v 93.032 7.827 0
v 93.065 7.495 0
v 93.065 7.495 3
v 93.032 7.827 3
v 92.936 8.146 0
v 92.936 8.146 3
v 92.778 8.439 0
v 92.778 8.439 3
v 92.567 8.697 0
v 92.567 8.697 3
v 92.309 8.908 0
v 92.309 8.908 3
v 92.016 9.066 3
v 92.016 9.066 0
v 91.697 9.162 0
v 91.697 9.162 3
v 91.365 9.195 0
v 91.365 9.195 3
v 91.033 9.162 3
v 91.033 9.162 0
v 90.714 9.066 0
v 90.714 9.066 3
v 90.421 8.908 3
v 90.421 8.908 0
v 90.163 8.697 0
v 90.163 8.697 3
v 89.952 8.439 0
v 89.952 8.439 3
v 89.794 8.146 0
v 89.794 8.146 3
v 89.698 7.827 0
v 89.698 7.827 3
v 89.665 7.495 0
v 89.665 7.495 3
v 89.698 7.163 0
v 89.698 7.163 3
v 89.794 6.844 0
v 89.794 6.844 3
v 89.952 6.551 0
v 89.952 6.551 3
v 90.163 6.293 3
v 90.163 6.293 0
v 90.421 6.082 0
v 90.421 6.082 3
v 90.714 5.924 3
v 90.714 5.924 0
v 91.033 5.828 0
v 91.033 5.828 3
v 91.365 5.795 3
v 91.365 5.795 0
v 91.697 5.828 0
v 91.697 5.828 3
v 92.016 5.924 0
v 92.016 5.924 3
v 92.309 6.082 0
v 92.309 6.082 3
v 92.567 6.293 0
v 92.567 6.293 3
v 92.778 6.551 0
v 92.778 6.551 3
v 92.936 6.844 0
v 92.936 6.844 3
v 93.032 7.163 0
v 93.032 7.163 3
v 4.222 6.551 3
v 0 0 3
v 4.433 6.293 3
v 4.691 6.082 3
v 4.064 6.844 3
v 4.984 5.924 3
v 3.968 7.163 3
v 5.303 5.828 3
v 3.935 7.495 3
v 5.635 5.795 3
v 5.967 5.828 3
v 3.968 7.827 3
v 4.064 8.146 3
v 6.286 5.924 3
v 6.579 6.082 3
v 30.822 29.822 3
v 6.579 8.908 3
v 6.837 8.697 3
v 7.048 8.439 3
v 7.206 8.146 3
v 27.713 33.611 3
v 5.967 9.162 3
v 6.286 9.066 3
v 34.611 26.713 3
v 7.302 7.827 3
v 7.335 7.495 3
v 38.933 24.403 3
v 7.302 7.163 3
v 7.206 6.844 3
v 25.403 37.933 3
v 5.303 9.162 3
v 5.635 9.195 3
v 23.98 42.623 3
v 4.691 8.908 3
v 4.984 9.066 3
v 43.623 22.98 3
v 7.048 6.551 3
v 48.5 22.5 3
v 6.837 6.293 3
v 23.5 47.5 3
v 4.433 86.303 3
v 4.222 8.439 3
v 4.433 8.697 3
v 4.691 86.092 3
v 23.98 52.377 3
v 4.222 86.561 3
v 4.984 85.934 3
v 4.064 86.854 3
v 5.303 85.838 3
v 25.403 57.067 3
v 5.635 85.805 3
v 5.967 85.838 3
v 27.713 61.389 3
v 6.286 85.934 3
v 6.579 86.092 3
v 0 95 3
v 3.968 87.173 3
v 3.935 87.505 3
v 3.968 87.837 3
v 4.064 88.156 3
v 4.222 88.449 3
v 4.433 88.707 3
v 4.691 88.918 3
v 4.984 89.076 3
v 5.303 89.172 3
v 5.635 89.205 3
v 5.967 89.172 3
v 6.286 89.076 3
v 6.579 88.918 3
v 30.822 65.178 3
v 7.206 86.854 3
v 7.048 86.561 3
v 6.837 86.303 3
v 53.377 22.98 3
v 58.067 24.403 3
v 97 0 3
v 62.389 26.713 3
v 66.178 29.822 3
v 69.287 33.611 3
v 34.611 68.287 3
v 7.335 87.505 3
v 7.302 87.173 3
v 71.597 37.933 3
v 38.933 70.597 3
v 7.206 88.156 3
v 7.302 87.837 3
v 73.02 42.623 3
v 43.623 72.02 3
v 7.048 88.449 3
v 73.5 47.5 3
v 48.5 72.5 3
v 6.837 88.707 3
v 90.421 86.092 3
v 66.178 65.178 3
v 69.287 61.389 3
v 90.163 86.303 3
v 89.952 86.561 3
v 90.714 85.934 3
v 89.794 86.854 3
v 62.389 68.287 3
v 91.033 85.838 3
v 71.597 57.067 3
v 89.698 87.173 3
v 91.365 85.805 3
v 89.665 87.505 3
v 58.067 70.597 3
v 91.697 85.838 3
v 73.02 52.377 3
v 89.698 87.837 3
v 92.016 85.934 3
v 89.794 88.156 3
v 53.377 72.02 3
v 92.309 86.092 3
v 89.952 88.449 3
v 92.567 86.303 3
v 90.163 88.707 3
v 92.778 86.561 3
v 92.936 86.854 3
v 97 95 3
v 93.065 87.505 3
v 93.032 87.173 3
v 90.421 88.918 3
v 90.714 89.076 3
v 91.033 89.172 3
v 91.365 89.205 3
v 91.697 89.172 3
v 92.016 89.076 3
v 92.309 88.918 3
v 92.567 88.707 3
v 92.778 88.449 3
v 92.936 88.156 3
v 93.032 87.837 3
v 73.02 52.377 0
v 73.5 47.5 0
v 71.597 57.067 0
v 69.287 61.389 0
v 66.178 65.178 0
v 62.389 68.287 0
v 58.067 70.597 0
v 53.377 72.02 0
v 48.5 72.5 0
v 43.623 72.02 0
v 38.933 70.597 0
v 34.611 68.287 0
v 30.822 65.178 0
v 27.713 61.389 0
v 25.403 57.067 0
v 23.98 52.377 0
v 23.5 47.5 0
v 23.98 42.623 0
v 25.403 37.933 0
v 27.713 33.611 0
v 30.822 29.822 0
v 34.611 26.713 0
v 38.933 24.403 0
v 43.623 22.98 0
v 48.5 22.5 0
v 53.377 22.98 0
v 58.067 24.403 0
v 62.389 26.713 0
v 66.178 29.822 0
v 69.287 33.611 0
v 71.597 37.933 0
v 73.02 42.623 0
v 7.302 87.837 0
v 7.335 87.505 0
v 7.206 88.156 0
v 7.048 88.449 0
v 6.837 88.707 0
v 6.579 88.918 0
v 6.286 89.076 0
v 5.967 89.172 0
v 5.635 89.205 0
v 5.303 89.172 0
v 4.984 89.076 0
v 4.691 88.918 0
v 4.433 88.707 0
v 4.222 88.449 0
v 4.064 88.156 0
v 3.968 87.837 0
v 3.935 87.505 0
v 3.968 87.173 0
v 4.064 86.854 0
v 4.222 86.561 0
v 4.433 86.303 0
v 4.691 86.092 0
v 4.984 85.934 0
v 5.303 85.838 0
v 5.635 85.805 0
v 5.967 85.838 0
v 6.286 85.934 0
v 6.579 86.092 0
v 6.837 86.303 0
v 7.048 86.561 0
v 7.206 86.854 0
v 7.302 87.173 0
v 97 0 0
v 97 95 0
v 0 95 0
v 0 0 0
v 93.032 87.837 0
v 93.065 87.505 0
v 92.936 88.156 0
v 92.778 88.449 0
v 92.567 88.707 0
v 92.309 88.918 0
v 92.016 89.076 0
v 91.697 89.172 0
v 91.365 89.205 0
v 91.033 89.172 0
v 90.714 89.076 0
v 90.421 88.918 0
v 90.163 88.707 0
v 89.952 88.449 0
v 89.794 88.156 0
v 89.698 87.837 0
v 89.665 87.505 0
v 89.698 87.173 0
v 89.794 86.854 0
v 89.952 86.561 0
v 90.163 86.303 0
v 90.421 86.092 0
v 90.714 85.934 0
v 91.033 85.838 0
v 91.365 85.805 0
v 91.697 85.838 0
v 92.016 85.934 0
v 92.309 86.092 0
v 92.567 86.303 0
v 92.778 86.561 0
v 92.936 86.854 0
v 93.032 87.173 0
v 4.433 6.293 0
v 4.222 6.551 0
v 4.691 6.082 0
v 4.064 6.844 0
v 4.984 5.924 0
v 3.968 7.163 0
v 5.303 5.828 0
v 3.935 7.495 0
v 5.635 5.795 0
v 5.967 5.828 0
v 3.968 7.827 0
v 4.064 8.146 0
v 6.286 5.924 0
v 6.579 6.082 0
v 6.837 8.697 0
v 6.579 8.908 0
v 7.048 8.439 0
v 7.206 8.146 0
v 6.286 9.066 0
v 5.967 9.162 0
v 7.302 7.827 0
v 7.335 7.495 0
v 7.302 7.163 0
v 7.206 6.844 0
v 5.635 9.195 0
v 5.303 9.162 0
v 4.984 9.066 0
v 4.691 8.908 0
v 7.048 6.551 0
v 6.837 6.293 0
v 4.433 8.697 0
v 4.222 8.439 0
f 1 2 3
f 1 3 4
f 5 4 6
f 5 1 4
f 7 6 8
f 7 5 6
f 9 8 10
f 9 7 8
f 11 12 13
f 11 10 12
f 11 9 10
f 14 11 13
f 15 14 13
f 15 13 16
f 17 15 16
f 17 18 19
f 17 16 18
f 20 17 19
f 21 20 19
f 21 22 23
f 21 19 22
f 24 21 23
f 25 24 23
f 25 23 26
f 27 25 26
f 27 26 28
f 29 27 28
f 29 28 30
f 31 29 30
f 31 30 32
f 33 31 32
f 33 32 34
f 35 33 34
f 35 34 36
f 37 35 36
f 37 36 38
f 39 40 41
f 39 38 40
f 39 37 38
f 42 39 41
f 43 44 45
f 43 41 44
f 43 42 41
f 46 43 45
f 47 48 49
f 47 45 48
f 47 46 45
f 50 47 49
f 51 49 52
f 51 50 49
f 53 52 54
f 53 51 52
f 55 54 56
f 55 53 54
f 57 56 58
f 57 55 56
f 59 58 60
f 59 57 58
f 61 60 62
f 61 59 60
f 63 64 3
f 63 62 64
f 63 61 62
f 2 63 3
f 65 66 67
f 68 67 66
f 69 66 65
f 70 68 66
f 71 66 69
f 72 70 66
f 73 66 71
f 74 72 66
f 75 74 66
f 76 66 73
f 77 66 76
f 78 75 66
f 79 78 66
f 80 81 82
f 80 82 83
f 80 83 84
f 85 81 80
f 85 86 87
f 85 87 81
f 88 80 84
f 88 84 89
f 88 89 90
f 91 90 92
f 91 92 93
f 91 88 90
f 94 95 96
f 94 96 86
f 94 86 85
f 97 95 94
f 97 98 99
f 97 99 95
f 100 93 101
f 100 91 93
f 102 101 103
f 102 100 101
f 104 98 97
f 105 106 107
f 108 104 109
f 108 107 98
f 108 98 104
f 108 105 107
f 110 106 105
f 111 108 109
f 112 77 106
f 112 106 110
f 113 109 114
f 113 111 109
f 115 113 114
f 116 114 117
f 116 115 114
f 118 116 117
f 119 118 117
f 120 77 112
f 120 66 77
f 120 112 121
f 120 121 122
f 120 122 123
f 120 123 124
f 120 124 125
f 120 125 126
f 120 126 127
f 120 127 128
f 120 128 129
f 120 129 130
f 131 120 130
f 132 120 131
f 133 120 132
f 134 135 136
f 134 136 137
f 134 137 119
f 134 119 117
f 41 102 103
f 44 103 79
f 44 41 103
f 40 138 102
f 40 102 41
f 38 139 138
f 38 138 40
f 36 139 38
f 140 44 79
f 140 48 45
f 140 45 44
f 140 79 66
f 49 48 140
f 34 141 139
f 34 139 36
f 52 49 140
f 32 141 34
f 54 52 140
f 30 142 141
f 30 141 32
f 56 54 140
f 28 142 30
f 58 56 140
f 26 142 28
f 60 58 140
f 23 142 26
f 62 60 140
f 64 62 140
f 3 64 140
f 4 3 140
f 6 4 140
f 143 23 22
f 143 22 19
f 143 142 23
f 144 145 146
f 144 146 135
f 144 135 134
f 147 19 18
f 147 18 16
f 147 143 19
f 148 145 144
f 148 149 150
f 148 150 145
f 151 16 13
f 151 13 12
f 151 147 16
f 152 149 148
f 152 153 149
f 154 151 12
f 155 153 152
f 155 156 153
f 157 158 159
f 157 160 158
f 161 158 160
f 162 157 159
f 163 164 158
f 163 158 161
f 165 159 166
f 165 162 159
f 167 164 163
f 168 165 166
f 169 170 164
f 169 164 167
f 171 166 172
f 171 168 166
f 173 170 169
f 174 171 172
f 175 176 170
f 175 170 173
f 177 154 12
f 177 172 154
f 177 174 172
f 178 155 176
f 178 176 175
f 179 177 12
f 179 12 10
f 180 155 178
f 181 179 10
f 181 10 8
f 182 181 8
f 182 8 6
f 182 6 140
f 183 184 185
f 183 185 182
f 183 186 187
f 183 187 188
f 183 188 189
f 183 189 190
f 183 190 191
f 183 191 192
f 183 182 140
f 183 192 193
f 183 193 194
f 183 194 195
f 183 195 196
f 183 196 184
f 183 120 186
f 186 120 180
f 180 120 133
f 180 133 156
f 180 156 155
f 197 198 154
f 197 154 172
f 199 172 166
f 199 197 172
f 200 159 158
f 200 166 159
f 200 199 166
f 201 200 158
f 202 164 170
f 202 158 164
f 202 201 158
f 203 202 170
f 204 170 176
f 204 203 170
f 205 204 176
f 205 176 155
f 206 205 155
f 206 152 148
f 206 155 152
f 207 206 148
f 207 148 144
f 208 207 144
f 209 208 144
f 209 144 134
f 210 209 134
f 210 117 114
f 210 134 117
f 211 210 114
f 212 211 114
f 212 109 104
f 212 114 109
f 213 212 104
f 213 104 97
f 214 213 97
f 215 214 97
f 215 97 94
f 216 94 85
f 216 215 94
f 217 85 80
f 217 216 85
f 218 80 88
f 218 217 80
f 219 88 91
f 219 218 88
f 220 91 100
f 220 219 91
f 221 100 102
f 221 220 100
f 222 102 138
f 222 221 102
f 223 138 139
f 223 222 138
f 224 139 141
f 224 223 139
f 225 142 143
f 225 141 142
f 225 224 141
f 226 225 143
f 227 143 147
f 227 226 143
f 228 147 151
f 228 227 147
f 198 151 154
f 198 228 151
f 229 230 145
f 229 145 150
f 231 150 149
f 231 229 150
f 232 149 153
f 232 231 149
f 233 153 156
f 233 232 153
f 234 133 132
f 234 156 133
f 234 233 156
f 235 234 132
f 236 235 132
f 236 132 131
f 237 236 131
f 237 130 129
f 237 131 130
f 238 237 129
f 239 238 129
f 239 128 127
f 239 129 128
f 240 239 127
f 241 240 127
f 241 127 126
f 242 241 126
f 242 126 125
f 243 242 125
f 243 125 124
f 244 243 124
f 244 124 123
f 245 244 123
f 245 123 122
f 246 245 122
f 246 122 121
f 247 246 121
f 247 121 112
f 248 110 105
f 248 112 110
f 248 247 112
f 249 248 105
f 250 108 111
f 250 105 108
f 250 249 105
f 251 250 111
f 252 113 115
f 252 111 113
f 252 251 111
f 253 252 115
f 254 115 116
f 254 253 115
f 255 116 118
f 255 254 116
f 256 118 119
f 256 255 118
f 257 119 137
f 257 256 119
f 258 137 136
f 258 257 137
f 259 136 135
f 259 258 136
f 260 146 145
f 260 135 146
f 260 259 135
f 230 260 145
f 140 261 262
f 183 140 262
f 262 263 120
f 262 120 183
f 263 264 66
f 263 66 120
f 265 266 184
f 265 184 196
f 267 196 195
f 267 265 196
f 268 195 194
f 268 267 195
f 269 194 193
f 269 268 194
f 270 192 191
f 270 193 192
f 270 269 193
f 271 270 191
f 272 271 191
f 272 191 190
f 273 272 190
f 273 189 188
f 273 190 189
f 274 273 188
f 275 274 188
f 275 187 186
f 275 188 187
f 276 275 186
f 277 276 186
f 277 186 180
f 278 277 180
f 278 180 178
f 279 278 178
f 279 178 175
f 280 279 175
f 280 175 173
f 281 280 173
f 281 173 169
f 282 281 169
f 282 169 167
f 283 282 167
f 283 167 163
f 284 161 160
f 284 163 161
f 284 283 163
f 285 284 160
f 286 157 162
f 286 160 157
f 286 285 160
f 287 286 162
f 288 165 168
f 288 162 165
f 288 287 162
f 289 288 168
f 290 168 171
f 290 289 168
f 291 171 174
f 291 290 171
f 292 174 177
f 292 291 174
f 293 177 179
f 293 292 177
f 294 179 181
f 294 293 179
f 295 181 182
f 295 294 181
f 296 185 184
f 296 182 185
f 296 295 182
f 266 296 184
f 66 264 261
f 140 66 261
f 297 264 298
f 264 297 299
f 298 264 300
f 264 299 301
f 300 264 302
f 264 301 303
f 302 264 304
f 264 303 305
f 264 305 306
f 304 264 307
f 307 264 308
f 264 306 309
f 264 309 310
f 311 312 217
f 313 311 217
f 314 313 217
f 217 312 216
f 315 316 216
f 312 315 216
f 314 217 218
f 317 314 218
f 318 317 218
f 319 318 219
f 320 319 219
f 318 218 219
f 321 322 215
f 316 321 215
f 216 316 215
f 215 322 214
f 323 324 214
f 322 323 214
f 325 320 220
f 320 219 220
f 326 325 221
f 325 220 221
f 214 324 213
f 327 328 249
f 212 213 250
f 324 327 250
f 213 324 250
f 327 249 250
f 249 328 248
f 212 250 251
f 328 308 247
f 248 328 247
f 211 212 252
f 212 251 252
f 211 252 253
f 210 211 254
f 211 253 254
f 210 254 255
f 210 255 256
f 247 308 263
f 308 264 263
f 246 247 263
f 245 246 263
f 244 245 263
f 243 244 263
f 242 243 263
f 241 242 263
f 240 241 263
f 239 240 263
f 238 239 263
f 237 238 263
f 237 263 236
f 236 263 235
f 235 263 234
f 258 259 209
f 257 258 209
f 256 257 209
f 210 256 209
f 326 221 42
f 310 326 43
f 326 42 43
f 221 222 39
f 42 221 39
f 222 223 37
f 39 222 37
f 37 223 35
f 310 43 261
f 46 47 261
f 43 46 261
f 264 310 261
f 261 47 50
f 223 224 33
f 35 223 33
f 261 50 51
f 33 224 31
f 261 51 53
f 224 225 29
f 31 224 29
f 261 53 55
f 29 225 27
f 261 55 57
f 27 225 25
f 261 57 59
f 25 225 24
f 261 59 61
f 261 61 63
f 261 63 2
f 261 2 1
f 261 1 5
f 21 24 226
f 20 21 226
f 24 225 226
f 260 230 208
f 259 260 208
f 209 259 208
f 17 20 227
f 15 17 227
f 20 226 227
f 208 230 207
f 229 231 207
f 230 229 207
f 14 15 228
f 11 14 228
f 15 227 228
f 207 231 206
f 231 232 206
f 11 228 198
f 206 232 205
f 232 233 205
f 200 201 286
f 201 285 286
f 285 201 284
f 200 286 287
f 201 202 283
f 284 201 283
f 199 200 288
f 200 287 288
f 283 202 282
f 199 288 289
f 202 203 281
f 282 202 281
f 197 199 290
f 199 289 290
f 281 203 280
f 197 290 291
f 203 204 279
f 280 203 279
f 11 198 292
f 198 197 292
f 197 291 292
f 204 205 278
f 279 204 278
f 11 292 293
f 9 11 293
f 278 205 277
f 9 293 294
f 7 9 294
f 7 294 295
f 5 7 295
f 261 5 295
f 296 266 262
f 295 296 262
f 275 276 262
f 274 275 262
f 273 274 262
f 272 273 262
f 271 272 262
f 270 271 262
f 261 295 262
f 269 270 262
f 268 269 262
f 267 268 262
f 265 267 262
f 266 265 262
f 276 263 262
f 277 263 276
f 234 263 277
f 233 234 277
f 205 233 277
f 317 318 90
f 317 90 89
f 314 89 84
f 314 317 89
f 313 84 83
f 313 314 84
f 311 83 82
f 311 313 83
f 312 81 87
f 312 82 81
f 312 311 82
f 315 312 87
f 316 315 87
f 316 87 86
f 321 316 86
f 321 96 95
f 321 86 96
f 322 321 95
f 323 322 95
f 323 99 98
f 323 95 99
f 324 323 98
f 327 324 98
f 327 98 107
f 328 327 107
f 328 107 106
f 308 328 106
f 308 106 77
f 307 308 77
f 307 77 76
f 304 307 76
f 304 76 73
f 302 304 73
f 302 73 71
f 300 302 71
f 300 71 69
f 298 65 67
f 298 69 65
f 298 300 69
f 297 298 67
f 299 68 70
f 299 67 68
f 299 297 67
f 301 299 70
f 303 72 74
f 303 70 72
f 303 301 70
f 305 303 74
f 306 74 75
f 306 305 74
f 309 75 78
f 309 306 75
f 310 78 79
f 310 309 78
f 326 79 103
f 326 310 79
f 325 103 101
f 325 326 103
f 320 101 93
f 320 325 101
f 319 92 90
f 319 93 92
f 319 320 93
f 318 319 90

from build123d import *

# Parameters (mm, degrees)
BODY_SKETCH_W    = 97
BODY_SKETCH_H    = 95
BODY_DEPTH       = 3
HOLES_DEPTH      = 136.805007271
HOLES_DEPTH_BACK = 136.805007271
HOLES_SKETCH_R   = 1.7
HOLES_SKETCH_R_2 = 25


with BuildPart() as part:
    # Body sketch → Body (new body)
    with BuildSketch(Plane.XY):
        with Locations((48.5, 47.5)):
            Rectangle(BODY_SKETCH_W, BODY_SKETCH_H)
    extrude(amount=BODY_DEPTH)

    # Holes sketch → Holes (cut, two sides: drawn at the far end of the back side and taken through both)
    with BuildSketch(Plane.XY.offset(-HOLES_DEPTH_BACK)):
        with Locations((5.635, 7.495)):
            Circle(HOLES_SKETCH_R)
        with Locations((91.365, 7.495)):
            Circle(HOLES_SKETCH_R)
        with Locations((5.635, 87.505)):
            Circle(HOLES_SKETCH_R)
        with Locations((91.365, 87.505)):
            Circle(HOLES_SKETCH_R)
        with Locations((48.5, 47.5)):
            Circle(HOLES_SKETCH_R_2)
    extrude(amount=HOLES_DEPTH + HOLES_DEPTH_BACK, mode=Mode.SUBTRACT)


solid = part.part
